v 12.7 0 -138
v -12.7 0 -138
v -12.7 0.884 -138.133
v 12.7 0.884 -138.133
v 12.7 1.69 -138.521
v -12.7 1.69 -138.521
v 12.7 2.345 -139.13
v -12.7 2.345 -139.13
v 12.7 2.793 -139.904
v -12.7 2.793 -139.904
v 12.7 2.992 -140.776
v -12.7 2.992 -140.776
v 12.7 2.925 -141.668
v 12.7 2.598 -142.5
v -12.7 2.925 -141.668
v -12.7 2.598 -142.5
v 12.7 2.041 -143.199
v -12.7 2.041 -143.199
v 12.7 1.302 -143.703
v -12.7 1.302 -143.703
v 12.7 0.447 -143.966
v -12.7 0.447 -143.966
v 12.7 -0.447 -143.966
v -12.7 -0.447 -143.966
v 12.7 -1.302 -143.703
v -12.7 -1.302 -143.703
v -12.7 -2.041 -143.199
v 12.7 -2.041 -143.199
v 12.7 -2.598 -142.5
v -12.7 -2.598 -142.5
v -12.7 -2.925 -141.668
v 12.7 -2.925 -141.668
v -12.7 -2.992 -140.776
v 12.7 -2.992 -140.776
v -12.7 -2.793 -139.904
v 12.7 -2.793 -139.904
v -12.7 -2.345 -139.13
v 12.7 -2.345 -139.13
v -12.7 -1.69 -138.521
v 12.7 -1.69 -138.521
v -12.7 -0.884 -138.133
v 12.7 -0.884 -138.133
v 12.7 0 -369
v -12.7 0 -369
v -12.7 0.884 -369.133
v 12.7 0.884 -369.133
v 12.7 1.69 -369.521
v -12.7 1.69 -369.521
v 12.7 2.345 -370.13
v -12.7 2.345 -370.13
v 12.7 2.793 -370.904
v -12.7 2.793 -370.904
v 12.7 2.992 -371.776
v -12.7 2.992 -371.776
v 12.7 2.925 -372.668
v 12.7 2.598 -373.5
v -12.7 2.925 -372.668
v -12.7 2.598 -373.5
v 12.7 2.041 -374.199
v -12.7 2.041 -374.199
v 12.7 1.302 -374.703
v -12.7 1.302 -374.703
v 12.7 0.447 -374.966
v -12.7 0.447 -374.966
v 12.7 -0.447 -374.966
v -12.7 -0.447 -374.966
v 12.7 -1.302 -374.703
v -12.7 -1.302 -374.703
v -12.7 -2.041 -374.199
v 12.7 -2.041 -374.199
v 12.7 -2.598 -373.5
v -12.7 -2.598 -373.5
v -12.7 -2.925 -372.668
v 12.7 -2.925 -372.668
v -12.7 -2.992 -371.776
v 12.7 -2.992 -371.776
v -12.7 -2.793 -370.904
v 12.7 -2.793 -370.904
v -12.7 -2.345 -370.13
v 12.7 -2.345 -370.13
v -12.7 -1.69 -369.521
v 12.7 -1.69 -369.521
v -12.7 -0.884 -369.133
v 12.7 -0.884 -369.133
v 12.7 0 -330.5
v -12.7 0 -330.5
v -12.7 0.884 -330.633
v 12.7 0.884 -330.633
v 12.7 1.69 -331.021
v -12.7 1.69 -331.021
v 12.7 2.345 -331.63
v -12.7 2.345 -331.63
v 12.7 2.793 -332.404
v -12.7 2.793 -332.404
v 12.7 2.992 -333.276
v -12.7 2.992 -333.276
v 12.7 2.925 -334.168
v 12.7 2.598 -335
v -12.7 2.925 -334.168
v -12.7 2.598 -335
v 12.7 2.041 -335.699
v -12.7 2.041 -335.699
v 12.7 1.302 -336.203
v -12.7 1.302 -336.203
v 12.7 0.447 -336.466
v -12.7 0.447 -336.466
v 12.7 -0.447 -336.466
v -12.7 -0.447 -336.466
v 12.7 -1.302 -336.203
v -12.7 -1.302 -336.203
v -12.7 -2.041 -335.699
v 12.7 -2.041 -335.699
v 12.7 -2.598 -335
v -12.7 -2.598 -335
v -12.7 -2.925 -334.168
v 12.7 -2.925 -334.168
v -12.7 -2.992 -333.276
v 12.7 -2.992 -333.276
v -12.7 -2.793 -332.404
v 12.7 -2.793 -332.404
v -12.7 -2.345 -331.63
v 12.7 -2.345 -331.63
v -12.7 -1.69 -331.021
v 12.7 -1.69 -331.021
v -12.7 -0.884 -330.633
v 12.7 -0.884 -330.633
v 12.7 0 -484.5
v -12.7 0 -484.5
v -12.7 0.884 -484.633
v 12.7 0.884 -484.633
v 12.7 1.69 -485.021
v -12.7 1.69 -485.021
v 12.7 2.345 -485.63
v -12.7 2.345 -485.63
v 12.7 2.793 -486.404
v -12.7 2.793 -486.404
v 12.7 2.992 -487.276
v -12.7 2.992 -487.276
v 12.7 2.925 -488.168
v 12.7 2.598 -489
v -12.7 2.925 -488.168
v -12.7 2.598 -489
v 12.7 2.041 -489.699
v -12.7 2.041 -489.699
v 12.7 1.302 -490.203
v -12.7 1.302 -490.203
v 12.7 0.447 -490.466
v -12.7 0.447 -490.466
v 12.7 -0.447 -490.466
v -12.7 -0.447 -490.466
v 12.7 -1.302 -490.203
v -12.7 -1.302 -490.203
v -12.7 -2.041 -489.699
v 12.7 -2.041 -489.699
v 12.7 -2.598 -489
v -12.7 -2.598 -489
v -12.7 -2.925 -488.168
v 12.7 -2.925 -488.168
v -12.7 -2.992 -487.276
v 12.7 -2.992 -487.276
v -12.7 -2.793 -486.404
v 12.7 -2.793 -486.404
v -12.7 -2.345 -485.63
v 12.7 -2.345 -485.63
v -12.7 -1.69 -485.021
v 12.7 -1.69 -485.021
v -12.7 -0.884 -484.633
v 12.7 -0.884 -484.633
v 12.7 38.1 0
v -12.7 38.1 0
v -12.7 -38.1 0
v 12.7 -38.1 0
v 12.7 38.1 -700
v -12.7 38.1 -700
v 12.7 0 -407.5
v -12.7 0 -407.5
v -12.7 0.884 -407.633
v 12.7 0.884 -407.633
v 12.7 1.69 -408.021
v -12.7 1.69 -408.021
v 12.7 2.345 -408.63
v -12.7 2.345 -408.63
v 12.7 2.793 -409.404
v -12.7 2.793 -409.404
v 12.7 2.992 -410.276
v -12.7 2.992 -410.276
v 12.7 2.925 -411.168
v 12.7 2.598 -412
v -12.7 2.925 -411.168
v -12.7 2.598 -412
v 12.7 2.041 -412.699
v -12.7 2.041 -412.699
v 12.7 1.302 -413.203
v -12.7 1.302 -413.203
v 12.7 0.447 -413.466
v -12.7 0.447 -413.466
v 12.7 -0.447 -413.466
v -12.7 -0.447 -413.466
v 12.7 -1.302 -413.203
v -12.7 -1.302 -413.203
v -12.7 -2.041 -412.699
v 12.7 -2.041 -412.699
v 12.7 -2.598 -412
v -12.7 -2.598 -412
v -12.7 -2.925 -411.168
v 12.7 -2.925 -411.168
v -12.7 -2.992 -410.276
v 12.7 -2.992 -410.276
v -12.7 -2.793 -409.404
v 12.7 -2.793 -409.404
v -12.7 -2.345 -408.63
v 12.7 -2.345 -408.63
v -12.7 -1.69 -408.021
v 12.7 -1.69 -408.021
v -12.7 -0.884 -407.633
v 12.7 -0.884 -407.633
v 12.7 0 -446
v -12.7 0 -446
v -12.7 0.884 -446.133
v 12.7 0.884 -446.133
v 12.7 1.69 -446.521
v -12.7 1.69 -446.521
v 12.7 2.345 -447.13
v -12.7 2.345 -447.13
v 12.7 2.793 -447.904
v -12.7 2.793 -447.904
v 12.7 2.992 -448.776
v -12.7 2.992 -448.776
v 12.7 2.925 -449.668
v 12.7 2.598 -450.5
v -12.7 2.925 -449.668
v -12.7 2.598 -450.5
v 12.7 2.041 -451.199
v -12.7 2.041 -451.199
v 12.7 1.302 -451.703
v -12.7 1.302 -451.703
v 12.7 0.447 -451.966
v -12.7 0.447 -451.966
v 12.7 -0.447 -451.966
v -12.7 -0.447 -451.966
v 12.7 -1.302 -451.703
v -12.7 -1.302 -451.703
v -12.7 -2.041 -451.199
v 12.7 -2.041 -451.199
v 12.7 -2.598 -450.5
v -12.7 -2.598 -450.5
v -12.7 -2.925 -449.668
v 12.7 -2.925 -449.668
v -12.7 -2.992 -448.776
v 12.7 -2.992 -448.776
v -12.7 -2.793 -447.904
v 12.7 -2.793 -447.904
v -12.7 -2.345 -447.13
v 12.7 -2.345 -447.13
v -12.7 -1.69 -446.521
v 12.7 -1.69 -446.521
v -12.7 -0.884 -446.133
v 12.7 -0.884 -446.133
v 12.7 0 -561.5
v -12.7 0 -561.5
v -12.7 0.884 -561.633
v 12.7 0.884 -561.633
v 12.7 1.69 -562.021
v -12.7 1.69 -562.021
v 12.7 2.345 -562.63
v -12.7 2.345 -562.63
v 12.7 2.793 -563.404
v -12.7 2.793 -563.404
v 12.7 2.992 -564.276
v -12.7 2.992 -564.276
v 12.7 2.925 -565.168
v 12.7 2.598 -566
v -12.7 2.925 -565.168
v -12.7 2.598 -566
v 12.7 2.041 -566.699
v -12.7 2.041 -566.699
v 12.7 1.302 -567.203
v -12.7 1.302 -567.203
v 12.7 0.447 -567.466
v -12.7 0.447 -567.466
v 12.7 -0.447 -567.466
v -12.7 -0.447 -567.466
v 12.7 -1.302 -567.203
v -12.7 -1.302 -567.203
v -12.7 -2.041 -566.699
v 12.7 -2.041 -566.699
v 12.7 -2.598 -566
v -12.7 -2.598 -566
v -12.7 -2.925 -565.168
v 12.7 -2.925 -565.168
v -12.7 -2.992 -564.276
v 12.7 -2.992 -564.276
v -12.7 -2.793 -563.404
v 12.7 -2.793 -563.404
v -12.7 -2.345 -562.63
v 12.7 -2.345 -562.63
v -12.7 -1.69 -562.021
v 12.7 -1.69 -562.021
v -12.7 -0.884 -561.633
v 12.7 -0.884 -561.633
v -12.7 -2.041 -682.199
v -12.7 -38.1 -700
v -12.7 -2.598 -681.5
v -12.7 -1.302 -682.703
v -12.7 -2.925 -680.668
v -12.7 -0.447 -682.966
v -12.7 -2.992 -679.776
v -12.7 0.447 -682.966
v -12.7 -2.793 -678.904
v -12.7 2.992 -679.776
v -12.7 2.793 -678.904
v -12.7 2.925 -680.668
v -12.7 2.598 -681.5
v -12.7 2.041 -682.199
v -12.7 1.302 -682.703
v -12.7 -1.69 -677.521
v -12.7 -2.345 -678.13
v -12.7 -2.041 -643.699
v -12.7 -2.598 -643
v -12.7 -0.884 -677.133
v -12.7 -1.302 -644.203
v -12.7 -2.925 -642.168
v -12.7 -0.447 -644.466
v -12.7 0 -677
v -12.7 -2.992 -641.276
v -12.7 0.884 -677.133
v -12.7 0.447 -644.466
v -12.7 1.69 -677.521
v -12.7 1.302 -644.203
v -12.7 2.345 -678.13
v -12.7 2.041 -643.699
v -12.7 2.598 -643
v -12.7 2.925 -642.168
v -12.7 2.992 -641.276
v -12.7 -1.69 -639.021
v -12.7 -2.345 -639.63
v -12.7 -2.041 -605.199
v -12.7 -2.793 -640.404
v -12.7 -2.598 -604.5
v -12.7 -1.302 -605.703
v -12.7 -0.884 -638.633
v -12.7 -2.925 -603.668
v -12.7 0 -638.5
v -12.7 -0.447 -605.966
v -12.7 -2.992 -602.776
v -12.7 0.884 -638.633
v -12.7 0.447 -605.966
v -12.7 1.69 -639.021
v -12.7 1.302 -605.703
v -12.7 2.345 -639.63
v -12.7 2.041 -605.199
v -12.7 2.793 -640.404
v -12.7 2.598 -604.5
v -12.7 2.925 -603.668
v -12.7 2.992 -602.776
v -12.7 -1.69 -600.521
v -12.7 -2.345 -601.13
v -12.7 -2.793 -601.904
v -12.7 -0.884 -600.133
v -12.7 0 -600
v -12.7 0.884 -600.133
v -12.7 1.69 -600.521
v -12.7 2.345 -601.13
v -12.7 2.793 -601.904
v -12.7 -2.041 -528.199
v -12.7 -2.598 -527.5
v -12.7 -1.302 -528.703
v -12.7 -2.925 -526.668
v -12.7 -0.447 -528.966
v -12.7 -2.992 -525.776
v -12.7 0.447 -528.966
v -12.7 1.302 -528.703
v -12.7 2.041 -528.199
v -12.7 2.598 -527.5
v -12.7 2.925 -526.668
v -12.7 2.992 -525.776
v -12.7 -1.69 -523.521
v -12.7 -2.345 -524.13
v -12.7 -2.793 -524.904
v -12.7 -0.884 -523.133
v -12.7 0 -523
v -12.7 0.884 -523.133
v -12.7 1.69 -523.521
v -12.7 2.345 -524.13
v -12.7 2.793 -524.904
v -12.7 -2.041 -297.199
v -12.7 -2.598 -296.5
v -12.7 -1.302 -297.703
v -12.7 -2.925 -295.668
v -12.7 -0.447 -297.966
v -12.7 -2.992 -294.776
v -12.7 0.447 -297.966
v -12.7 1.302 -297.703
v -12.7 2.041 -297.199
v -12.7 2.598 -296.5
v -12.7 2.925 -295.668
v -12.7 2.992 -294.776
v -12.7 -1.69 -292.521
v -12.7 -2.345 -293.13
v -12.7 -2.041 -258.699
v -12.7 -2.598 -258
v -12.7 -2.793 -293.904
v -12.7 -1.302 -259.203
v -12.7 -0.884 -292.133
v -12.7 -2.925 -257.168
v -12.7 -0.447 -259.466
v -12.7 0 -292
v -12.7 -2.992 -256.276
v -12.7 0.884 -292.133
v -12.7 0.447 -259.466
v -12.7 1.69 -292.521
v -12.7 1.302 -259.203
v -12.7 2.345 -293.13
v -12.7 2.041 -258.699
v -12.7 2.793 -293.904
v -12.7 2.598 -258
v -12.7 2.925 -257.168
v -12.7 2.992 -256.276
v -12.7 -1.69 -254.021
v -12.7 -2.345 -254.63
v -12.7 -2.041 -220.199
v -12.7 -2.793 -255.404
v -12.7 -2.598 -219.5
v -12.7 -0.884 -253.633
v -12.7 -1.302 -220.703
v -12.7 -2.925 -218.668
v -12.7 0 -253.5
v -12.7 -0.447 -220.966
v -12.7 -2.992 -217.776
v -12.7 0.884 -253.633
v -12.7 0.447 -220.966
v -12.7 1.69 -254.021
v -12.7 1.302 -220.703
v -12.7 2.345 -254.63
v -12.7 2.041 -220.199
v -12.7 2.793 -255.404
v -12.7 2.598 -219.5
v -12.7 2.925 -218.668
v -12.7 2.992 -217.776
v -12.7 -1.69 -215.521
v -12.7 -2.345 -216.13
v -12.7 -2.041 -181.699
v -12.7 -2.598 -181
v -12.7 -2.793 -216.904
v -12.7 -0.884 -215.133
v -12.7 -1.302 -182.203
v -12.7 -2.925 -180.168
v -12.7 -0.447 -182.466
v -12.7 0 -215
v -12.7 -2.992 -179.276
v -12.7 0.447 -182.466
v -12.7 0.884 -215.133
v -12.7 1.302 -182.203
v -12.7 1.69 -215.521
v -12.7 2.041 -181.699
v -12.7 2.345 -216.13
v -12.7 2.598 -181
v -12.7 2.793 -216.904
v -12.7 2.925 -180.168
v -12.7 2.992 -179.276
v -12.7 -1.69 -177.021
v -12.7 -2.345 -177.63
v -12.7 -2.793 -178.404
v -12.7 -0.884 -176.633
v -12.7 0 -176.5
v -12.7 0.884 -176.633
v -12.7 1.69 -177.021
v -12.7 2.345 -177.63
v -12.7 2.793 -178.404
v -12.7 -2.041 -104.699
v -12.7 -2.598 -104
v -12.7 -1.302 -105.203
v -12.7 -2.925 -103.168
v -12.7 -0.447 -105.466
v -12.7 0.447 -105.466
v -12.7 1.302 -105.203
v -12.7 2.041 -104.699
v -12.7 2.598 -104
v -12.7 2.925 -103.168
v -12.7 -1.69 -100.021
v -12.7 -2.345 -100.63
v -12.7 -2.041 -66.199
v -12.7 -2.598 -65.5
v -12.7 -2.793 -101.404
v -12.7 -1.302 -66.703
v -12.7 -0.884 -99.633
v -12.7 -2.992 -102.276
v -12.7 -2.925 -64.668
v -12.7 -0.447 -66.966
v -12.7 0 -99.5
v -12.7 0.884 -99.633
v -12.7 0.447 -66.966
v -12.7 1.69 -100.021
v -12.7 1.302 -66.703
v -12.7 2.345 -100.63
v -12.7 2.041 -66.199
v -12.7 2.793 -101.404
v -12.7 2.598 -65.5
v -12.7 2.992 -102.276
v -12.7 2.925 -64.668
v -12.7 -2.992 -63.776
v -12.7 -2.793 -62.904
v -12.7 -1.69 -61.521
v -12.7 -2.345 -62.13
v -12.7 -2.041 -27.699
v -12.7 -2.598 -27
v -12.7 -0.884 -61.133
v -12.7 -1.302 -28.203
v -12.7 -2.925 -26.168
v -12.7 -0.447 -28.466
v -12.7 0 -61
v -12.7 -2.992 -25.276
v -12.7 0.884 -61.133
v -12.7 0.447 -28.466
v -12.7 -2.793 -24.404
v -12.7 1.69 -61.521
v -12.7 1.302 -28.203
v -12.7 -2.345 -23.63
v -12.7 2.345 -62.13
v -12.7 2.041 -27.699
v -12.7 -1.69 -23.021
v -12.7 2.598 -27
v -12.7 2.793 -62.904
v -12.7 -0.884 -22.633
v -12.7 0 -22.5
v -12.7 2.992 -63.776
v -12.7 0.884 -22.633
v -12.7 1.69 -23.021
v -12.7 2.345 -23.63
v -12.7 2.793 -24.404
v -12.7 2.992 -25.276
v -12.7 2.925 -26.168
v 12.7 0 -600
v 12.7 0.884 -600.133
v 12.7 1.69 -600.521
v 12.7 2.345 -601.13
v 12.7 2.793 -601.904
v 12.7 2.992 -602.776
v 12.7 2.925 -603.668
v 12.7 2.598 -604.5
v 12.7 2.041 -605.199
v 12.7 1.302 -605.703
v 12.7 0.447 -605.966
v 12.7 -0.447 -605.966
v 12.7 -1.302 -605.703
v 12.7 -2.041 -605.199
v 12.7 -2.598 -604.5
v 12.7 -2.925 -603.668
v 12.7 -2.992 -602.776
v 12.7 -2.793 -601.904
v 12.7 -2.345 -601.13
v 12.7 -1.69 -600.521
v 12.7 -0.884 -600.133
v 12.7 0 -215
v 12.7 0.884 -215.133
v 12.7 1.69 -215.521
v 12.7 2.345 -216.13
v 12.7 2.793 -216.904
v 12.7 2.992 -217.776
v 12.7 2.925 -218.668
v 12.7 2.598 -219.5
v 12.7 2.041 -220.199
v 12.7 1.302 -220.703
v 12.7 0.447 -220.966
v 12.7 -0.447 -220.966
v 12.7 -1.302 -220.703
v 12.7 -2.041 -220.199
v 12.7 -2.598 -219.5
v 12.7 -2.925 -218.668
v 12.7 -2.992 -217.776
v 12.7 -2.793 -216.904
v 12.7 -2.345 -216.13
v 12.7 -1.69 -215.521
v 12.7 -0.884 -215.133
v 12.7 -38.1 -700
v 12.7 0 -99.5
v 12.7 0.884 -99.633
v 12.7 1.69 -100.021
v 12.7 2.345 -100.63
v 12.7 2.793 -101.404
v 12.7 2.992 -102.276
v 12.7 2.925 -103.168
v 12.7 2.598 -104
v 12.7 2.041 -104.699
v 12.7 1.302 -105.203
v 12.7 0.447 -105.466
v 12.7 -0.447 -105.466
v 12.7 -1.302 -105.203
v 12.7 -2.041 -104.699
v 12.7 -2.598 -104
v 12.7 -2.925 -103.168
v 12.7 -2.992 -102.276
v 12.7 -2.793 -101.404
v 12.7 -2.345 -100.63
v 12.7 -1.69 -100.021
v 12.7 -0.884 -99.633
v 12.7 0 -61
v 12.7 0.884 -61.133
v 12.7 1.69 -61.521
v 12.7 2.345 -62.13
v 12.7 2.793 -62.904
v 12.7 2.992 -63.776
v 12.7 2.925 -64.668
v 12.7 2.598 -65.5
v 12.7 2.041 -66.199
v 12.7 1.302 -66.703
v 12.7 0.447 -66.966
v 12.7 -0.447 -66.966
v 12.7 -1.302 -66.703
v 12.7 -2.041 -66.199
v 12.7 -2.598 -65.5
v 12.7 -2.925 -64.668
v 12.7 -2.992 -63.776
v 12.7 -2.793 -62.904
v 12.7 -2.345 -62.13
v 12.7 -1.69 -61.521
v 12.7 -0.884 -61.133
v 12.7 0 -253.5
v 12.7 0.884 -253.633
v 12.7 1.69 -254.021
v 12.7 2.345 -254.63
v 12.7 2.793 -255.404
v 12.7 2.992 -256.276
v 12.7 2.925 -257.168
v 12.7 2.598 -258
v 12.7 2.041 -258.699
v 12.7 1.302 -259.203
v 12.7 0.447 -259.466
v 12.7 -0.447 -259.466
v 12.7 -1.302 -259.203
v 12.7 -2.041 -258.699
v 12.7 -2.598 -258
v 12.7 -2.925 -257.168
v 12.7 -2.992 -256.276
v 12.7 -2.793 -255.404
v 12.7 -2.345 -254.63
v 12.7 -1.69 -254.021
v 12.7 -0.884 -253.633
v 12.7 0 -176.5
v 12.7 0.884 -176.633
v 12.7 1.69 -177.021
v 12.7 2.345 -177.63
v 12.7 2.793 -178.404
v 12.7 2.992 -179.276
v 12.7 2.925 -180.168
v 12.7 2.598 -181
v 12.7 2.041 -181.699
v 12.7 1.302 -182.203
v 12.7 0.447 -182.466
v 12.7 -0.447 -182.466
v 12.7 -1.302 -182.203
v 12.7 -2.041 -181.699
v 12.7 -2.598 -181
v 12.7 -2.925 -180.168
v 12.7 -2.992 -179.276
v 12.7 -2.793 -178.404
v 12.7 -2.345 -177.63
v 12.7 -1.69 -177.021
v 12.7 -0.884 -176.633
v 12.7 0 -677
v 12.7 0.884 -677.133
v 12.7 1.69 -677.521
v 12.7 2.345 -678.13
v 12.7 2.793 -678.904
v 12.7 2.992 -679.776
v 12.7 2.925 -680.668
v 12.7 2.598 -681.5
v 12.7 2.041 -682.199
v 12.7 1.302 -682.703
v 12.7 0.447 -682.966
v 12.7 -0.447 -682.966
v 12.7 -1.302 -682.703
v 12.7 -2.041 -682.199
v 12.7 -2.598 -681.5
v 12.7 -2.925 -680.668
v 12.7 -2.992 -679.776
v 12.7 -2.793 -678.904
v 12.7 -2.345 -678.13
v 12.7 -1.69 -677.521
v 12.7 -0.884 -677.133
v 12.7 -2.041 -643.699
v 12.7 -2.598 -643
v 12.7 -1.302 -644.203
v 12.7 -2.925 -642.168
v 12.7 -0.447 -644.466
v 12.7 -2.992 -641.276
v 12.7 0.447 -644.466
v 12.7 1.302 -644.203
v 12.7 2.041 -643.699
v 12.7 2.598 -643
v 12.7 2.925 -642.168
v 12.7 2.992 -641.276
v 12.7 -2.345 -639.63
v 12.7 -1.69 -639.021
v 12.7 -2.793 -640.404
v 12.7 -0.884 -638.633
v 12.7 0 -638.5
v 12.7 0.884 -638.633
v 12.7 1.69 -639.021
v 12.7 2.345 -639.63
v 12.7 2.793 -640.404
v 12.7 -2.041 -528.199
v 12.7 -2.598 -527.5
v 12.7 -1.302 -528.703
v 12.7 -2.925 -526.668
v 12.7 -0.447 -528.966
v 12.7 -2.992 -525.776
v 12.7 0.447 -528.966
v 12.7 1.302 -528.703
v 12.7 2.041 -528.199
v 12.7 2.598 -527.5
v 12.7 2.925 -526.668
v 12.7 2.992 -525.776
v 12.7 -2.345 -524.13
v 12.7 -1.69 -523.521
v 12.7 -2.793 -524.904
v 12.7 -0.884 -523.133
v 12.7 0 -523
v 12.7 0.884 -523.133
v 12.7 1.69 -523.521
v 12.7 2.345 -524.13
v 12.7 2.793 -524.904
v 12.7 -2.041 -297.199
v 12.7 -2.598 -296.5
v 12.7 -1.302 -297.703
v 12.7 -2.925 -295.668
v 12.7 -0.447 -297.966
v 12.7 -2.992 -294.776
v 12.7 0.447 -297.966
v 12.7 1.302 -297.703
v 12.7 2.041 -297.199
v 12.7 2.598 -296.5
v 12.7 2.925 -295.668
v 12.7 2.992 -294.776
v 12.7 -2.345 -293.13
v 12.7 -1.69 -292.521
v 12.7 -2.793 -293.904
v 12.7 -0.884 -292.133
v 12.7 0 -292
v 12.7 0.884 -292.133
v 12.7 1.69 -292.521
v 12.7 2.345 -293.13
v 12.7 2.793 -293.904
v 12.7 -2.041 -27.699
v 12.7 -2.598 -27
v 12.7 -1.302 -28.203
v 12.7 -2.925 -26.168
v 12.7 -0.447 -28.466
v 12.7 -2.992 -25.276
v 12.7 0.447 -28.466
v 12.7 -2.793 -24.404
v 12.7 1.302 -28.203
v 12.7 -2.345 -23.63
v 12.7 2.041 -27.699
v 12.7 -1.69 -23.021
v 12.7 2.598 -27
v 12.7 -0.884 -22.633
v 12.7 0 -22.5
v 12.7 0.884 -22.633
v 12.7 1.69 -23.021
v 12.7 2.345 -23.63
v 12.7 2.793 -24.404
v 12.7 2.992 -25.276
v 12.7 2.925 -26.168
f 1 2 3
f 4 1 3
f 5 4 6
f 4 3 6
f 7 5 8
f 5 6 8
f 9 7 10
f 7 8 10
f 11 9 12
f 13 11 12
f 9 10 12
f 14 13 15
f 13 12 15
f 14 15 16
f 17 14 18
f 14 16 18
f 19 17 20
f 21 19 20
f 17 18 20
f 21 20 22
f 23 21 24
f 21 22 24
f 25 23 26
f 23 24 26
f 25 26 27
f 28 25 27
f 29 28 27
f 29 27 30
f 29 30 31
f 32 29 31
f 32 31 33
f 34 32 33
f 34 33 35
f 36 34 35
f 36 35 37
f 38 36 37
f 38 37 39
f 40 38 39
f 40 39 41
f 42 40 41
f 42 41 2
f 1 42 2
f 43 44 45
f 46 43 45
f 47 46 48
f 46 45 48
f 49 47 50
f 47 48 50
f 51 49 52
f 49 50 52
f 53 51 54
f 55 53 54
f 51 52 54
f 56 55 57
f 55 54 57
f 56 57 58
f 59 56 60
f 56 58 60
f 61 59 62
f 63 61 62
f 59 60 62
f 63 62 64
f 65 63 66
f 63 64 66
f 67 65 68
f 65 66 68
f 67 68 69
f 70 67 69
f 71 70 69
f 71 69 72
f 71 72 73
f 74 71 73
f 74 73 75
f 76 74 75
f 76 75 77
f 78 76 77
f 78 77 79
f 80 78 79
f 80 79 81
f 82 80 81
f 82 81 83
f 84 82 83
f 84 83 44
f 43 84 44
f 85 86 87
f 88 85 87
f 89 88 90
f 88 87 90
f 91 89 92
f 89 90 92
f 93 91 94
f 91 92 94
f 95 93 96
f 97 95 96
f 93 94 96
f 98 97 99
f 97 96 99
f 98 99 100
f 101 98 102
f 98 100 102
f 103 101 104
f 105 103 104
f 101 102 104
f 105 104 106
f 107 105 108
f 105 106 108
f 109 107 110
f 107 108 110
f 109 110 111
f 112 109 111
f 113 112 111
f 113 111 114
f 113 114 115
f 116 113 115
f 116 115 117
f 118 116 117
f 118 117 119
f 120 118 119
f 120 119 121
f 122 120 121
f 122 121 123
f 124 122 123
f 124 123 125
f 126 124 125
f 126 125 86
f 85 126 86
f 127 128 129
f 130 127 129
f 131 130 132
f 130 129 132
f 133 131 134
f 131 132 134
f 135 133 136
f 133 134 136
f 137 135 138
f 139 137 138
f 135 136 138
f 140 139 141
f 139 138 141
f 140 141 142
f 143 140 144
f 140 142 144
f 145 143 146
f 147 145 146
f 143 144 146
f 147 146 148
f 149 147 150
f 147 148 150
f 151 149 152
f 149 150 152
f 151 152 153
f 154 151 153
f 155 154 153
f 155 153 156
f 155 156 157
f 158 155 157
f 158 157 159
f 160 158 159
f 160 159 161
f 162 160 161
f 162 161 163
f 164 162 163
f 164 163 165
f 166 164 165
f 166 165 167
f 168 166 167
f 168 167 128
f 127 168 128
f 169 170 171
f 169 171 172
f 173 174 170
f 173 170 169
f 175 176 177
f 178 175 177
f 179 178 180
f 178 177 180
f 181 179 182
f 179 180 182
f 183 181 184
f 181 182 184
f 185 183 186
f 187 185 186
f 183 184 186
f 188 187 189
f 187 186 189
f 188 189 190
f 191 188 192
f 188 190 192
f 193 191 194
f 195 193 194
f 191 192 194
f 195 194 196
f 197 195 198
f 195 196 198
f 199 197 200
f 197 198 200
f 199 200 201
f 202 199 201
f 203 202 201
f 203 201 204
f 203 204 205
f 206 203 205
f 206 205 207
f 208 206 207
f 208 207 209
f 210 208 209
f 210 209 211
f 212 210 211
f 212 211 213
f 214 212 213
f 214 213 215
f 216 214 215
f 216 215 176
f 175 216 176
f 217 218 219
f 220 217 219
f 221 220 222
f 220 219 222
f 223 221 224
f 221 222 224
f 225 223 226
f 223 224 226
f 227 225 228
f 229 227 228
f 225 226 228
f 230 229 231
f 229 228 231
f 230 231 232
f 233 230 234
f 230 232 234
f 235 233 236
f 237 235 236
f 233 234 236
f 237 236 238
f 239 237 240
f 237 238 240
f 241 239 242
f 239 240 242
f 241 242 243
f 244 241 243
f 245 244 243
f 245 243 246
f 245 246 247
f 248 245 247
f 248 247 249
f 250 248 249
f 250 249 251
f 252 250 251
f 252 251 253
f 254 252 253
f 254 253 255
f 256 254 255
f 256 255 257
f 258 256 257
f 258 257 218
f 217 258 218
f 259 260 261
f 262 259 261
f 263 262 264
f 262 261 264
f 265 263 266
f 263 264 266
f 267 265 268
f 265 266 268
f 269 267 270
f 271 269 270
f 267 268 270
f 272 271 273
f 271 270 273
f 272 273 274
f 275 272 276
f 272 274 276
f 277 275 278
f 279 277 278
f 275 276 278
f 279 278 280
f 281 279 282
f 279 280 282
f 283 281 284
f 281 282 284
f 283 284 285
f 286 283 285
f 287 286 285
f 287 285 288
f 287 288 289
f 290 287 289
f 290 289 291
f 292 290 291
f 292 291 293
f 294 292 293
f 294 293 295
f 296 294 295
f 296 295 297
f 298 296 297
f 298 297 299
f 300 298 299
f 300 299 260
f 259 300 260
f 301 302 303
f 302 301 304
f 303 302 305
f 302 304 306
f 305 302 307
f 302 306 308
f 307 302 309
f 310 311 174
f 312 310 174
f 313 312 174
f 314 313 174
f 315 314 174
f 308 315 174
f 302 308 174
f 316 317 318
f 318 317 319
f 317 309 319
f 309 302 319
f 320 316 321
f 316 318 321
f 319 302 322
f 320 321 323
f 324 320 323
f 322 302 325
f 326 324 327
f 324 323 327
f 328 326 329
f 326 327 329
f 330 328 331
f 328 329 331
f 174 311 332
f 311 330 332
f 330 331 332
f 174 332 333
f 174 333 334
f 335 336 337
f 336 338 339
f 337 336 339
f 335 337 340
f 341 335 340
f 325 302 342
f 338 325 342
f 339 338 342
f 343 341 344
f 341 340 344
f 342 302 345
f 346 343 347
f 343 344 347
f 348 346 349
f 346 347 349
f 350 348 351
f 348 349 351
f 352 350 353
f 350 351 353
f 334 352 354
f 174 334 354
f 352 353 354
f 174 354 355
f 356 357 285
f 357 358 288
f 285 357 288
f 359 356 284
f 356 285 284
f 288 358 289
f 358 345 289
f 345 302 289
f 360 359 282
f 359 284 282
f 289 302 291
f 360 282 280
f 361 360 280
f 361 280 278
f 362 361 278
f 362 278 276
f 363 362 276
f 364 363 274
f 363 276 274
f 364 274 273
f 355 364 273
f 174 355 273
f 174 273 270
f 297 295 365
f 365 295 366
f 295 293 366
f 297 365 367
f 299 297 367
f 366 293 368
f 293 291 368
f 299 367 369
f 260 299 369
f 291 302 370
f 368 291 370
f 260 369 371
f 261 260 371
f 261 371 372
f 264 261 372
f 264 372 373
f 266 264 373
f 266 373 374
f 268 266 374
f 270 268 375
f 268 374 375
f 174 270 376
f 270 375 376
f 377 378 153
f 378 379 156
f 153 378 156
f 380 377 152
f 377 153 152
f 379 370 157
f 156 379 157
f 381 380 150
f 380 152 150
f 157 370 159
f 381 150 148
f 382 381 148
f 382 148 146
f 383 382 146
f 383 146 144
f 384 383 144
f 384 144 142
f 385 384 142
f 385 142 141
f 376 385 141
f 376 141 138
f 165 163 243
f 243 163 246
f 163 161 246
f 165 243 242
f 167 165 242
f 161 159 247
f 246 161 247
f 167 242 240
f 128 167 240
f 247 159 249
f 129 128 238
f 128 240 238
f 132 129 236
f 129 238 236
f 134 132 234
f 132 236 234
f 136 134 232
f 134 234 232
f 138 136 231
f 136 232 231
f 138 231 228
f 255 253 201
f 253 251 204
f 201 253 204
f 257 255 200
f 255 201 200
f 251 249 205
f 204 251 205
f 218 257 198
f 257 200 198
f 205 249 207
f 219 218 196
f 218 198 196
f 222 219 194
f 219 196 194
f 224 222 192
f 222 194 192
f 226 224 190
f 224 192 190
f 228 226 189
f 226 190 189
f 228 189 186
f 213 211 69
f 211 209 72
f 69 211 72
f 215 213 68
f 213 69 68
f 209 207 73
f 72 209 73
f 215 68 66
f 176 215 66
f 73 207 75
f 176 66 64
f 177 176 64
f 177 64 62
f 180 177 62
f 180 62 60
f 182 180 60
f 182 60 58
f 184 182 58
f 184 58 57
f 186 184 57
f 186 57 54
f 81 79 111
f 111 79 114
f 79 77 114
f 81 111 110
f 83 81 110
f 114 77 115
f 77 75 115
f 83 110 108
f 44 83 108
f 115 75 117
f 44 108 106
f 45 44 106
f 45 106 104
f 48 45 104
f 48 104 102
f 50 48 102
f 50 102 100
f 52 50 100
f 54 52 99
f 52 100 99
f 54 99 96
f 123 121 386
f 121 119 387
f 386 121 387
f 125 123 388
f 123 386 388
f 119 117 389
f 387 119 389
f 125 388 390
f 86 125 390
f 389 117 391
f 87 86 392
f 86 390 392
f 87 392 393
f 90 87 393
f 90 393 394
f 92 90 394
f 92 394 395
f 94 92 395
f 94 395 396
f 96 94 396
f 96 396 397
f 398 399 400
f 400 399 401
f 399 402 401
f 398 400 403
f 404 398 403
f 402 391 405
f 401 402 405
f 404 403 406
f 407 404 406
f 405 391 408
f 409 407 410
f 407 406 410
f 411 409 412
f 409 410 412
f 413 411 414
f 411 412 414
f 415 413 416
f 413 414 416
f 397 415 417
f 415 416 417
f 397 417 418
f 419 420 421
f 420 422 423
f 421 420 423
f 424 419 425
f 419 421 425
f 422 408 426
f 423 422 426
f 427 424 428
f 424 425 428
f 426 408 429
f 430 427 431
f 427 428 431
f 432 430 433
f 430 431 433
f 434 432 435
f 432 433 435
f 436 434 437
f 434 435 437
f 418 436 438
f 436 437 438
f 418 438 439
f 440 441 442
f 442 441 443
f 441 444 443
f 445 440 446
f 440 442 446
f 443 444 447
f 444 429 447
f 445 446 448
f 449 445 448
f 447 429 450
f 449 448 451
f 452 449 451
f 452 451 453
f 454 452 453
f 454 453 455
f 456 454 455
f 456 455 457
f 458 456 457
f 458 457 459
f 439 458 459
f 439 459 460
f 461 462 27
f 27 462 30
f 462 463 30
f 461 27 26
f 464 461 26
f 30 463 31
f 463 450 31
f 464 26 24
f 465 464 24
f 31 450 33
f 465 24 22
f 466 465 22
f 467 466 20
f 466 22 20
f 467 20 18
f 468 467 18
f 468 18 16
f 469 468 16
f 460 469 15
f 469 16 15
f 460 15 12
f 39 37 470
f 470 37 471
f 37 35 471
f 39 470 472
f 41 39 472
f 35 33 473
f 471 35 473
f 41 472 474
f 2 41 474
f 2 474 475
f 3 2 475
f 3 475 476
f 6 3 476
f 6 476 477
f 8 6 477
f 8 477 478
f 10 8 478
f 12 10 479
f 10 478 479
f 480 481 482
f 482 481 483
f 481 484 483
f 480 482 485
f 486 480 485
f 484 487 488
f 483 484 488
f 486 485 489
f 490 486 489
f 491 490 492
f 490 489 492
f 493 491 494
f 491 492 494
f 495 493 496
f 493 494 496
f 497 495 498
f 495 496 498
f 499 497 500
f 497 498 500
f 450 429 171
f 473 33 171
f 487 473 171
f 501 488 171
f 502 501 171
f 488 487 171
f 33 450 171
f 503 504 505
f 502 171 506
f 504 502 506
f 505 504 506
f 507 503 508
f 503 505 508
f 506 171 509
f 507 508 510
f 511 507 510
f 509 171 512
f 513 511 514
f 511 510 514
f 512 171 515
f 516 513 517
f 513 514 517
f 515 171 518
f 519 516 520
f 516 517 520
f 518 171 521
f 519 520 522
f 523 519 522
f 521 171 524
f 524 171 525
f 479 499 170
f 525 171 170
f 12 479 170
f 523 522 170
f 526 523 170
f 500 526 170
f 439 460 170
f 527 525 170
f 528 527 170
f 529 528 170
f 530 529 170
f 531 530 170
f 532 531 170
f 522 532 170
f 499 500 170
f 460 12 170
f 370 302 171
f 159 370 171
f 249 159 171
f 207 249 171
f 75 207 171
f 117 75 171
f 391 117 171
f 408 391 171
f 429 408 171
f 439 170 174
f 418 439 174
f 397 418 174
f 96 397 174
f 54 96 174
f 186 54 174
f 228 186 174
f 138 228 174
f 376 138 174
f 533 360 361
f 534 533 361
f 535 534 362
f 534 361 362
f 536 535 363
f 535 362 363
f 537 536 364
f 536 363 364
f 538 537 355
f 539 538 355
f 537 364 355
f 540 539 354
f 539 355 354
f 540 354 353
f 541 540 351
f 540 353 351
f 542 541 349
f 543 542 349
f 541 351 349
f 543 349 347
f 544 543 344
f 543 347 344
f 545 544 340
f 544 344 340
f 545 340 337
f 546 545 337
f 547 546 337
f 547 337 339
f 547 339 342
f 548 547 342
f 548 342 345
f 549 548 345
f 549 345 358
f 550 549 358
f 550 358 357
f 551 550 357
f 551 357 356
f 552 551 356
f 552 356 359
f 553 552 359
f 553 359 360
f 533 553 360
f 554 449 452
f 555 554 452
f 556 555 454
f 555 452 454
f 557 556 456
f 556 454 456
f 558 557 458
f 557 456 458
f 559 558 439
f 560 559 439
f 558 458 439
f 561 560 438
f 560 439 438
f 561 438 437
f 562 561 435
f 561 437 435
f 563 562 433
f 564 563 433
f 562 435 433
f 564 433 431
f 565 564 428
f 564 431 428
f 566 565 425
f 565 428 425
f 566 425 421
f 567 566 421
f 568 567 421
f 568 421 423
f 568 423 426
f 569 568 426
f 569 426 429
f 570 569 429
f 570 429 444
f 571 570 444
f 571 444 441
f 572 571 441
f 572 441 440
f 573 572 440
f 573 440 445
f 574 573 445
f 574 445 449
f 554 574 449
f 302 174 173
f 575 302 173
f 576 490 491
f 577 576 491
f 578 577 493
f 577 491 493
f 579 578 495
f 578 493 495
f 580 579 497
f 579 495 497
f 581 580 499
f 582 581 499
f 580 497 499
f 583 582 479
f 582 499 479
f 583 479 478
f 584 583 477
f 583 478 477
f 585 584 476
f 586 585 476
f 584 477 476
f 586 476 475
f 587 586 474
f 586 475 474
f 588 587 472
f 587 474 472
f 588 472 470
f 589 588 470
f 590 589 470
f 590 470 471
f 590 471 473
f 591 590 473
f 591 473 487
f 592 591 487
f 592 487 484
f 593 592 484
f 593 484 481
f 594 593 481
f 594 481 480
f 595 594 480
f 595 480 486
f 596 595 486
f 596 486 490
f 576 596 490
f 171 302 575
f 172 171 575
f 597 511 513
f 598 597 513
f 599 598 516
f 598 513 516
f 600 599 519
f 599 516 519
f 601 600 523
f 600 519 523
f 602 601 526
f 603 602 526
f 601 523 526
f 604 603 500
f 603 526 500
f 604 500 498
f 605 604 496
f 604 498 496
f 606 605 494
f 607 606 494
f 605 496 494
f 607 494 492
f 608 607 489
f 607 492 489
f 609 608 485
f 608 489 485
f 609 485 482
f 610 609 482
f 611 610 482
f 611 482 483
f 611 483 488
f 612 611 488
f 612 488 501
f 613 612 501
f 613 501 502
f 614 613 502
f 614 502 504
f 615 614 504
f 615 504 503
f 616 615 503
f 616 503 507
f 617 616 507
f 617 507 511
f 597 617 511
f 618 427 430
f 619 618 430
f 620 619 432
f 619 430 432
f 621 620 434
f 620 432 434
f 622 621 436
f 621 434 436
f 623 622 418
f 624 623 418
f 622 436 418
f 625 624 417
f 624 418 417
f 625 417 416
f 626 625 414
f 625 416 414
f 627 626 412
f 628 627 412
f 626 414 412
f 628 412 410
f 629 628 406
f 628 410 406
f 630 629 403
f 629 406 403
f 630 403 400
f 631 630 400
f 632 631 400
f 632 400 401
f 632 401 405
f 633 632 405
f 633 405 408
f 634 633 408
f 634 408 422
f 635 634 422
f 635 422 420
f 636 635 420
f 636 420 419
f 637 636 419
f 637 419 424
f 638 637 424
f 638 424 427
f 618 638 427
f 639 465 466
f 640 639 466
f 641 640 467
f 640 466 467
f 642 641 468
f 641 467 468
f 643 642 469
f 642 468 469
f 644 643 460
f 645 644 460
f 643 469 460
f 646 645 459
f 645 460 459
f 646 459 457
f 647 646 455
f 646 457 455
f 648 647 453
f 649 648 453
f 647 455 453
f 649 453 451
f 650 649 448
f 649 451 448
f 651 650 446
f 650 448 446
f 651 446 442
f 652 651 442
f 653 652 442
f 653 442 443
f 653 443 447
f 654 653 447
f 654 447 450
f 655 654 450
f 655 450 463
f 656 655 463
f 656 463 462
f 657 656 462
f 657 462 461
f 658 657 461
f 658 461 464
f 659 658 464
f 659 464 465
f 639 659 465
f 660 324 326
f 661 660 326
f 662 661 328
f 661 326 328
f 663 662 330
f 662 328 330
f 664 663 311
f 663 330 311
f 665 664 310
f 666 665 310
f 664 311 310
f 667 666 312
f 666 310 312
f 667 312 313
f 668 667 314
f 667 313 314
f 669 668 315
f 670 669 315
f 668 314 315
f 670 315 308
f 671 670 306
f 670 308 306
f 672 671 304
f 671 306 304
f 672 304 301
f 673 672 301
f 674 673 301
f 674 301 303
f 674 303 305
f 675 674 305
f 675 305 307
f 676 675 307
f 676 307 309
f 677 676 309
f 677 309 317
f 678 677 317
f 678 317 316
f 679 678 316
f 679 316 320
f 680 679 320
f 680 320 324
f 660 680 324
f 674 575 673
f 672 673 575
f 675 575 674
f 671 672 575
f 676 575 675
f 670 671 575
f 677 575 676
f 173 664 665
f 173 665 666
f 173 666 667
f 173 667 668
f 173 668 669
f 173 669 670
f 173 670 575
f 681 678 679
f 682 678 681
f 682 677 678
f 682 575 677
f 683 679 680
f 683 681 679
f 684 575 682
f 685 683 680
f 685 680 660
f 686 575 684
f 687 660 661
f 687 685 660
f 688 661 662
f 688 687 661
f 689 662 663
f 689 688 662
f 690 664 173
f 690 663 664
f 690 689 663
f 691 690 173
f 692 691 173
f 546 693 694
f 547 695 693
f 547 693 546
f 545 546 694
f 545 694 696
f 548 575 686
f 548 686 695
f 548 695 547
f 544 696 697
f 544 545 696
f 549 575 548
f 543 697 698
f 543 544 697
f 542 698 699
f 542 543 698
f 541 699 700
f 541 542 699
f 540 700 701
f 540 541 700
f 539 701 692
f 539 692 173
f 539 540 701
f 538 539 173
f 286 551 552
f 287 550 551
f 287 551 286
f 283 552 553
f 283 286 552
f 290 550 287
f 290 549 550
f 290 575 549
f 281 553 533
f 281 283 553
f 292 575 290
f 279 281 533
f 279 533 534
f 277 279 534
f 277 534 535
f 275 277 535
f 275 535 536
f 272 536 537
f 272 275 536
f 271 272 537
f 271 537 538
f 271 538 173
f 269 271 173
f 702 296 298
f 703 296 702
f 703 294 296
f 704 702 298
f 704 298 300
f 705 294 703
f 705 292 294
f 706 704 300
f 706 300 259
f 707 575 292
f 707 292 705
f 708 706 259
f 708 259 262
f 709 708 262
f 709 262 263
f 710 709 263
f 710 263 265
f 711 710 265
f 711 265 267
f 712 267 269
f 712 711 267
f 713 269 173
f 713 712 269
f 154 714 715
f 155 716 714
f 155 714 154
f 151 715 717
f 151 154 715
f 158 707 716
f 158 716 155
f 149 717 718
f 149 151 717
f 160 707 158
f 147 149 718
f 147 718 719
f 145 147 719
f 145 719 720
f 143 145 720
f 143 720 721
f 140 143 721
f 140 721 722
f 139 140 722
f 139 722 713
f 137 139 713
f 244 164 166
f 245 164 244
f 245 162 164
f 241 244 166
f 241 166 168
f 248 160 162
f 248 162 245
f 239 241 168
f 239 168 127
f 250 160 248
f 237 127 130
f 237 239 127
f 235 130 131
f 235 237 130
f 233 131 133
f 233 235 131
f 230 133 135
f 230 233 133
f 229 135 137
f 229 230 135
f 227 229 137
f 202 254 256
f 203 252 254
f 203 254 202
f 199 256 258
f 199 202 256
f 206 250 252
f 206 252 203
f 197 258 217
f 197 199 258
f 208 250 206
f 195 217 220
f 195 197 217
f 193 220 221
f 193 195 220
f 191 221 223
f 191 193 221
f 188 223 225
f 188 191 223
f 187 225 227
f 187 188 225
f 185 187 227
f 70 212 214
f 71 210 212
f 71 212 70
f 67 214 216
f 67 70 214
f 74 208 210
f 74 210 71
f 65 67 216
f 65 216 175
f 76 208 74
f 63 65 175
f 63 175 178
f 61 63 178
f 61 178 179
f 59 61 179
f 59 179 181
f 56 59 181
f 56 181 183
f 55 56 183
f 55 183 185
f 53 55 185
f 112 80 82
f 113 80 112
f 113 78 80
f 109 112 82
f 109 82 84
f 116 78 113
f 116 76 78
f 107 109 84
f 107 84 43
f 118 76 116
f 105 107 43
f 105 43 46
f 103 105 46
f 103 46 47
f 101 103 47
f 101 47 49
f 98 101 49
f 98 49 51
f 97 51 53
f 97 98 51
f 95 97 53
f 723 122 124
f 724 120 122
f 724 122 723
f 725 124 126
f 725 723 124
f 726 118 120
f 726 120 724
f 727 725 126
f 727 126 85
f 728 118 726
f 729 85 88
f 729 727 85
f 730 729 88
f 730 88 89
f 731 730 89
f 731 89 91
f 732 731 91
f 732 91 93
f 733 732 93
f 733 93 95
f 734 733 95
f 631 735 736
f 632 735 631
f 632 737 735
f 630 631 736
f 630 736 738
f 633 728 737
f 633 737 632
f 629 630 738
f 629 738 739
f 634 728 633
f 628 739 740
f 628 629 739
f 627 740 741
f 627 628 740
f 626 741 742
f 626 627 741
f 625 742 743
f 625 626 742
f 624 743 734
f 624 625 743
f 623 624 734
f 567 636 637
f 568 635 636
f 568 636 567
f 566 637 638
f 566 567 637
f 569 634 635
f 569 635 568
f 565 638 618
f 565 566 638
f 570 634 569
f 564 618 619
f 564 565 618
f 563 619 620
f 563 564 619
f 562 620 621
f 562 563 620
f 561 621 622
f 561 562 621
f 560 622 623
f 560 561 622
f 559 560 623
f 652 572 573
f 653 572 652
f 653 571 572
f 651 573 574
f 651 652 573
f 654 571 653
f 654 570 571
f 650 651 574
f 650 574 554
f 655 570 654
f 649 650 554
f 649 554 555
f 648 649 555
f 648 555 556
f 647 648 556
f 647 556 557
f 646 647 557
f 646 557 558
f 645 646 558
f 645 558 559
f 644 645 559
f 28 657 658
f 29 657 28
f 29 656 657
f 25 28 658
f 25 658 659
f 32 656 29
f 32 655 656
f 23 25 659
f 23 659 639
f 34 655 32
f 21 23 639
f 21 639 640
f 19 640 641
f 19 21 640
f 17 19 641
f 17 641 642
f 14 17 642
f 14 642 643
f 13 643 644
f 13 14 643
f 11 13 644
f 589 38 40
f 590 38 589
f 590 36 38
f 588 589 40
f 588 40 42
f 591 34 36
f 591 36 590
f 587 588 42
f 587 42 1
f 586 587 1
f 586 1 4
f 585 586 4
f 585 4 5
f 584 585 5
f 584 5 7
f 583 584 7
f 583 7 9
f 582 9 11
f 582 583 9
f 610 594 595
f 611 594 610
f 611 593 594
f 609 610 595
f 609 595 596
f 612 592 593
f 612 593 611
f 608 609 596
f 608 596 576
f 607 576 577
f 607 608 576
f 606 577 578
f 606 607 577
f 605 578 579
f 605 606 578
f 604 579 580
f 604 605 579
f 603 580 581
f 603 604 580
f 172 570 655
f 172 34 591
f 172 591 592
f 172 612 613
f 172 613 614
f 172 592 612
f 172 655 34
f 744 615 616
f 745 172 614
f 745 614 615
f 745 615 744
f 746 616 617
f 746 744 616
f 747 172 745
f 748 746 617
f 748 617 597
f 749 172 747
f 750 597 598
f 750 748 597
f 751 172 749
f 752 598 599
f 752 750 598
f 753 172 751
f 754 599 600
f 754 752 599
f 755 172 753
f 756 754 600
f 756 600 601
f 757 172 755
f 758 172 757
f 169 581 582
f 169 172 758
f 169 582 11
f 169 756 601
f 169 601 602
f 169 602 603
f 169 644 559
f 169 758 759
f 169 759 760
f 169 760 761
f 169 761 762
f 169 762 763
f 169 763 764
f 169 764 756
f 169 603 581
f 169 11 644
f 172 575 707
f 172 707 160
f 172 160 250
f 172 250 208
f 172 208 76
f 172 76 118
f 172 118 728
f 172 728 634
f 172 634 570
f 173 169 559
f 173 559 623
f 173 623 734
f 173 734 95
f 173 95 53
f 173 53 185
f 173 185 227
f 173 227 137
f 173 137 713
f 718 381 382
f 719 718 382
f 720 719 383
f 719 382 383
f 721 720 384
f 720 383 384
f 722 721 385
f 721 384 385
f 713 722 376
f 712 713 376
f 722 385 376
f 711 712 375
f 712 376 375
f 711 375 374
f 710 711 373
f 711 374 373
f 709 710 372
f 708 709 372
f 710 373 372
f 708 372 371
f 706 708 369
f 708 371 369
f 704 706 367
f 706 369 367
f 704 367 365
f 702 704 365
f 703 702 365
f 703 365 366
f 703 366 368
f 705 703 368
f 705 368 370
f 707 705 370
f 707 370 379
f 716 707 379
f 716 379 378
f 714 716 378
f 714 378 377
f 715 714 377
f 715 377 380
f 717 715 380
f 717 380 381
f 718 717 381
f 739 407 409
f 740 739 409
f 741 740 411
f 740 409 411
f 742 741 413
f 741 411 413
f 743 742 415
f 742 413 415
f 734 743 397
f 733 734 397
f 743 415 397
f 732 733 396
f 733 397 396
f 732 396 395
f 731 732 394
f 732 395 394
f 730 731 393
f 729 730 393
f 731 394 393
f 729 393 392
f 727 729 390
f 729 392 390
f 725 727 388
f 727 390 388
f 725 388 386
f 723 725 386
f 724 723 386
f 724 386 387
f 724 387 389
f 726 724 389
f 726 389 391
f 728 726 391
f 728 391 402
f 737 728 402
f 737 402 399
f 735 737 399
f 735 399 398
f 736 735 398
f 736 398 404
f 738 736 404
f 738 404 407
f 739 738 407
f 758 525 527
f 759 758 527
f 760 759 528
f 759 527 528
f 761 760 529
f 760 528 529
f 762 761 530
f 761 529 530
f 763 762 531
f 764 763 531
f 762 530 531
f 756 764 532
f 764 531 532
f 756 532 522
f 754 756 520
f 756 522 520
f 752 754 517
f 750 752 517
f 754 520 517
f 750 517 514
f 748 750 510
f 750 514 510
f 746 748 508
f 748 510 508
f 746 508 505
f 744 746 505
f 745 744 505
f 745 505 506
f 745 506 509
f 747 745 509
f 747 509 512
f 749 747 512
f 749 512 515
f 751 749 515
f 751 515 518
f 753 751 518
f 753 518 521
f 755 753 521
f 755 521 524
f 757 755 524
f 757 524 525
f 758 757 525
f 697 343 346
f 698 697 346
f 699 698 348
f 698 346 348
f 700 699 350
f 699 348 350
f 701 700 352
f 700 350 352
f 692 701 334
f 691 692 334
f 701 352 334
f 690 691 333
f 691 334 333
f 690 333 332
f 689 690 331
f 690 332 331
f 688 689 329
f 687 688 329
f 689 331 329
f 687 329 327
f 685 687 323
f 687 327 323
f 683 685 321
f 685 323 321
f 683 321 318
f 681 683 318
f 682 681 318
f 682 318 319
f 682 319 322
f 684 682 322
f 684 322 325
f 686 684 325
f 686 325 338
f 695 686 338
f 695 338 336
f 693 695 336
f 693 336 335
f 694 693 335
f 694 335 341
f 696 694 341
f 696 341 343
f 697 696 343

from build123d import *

# Parameters (mm, degrees)
CROQUIS2_W              = 25.4
CROQUIS2_H              = 76.2
SALIENTE_EXTRUIR1_DEPTH = 700
CROQUIS3_R              = 3
CORTAR_EXTRUIR1_DEPTH   = 26.4


with BuildPart() as part:
    # Croquis2 → Saliente-Extruir1 (new body)
    with BuildSketch(Plane.XY):
        Rectangle(CROQUIS2_W, CROQUIS2_H)
    extrude(amount=-SALIENTE_EXTRUIR1_DEPTH)

    # Croquis3 → Cortar-Extruir1 (cut, through all)
    with BuildSketch(Plane.ZY.offset(12.7)):
        with Locations((-680, 0)):
            Circle(CROQUIS3_R)
        with Locations((-641.5, 0)):
            Circle(CROQUIS3_R)
        with Locations((-603, 0)):
            Circle(CROQUIS3_R)
        with Locations((-564.5, 0)):
            Circle(CROQUIS3_R)
        with Locations((-526, 0)):
            Circle(CROQUIS3_R)
        with Locations((-487.5, 0)):
            Circle(CROQUIS3_R)
        with Locations((-449, 0)):
            Circle(CROQUIS3_R)
        with Locations((-410.5, 0)):
            Circle(CROQUIS3_R)
        with Locations((-372, 0)):
            Circle(CROQUIS3_R)
        with Locations((-333.5, 0)):
            Circle(CROQUIS3_R)
        with Locations((-295, 0)):
            Circle(CROQUIS3_R)
        with Locations((-256.5, 0)):
            Circle(CROQUIS3_R)
        with Locations((-218, 0)):
            Circle(CROQUIS3_R)
        with Locations((-179.5, 0)):
            Circle(CROQUIS3_R)
        with Locations((-141, 0)):
            Circle(CROQUIS3_R)
        with Locations((-102.5, 0)):
            Circle(CROQUIS3_R)
        with Locations((-64, 0)):
            Circle(CROQUIS3_R)
        with Locations((-25.5, 0)):
            Circle(CROQUIS3_R)
    extrude(amount=-CORTAR_EXTRUIR1_DEPTH, mode=Mode.SUBTRACT)


solid = part.part
